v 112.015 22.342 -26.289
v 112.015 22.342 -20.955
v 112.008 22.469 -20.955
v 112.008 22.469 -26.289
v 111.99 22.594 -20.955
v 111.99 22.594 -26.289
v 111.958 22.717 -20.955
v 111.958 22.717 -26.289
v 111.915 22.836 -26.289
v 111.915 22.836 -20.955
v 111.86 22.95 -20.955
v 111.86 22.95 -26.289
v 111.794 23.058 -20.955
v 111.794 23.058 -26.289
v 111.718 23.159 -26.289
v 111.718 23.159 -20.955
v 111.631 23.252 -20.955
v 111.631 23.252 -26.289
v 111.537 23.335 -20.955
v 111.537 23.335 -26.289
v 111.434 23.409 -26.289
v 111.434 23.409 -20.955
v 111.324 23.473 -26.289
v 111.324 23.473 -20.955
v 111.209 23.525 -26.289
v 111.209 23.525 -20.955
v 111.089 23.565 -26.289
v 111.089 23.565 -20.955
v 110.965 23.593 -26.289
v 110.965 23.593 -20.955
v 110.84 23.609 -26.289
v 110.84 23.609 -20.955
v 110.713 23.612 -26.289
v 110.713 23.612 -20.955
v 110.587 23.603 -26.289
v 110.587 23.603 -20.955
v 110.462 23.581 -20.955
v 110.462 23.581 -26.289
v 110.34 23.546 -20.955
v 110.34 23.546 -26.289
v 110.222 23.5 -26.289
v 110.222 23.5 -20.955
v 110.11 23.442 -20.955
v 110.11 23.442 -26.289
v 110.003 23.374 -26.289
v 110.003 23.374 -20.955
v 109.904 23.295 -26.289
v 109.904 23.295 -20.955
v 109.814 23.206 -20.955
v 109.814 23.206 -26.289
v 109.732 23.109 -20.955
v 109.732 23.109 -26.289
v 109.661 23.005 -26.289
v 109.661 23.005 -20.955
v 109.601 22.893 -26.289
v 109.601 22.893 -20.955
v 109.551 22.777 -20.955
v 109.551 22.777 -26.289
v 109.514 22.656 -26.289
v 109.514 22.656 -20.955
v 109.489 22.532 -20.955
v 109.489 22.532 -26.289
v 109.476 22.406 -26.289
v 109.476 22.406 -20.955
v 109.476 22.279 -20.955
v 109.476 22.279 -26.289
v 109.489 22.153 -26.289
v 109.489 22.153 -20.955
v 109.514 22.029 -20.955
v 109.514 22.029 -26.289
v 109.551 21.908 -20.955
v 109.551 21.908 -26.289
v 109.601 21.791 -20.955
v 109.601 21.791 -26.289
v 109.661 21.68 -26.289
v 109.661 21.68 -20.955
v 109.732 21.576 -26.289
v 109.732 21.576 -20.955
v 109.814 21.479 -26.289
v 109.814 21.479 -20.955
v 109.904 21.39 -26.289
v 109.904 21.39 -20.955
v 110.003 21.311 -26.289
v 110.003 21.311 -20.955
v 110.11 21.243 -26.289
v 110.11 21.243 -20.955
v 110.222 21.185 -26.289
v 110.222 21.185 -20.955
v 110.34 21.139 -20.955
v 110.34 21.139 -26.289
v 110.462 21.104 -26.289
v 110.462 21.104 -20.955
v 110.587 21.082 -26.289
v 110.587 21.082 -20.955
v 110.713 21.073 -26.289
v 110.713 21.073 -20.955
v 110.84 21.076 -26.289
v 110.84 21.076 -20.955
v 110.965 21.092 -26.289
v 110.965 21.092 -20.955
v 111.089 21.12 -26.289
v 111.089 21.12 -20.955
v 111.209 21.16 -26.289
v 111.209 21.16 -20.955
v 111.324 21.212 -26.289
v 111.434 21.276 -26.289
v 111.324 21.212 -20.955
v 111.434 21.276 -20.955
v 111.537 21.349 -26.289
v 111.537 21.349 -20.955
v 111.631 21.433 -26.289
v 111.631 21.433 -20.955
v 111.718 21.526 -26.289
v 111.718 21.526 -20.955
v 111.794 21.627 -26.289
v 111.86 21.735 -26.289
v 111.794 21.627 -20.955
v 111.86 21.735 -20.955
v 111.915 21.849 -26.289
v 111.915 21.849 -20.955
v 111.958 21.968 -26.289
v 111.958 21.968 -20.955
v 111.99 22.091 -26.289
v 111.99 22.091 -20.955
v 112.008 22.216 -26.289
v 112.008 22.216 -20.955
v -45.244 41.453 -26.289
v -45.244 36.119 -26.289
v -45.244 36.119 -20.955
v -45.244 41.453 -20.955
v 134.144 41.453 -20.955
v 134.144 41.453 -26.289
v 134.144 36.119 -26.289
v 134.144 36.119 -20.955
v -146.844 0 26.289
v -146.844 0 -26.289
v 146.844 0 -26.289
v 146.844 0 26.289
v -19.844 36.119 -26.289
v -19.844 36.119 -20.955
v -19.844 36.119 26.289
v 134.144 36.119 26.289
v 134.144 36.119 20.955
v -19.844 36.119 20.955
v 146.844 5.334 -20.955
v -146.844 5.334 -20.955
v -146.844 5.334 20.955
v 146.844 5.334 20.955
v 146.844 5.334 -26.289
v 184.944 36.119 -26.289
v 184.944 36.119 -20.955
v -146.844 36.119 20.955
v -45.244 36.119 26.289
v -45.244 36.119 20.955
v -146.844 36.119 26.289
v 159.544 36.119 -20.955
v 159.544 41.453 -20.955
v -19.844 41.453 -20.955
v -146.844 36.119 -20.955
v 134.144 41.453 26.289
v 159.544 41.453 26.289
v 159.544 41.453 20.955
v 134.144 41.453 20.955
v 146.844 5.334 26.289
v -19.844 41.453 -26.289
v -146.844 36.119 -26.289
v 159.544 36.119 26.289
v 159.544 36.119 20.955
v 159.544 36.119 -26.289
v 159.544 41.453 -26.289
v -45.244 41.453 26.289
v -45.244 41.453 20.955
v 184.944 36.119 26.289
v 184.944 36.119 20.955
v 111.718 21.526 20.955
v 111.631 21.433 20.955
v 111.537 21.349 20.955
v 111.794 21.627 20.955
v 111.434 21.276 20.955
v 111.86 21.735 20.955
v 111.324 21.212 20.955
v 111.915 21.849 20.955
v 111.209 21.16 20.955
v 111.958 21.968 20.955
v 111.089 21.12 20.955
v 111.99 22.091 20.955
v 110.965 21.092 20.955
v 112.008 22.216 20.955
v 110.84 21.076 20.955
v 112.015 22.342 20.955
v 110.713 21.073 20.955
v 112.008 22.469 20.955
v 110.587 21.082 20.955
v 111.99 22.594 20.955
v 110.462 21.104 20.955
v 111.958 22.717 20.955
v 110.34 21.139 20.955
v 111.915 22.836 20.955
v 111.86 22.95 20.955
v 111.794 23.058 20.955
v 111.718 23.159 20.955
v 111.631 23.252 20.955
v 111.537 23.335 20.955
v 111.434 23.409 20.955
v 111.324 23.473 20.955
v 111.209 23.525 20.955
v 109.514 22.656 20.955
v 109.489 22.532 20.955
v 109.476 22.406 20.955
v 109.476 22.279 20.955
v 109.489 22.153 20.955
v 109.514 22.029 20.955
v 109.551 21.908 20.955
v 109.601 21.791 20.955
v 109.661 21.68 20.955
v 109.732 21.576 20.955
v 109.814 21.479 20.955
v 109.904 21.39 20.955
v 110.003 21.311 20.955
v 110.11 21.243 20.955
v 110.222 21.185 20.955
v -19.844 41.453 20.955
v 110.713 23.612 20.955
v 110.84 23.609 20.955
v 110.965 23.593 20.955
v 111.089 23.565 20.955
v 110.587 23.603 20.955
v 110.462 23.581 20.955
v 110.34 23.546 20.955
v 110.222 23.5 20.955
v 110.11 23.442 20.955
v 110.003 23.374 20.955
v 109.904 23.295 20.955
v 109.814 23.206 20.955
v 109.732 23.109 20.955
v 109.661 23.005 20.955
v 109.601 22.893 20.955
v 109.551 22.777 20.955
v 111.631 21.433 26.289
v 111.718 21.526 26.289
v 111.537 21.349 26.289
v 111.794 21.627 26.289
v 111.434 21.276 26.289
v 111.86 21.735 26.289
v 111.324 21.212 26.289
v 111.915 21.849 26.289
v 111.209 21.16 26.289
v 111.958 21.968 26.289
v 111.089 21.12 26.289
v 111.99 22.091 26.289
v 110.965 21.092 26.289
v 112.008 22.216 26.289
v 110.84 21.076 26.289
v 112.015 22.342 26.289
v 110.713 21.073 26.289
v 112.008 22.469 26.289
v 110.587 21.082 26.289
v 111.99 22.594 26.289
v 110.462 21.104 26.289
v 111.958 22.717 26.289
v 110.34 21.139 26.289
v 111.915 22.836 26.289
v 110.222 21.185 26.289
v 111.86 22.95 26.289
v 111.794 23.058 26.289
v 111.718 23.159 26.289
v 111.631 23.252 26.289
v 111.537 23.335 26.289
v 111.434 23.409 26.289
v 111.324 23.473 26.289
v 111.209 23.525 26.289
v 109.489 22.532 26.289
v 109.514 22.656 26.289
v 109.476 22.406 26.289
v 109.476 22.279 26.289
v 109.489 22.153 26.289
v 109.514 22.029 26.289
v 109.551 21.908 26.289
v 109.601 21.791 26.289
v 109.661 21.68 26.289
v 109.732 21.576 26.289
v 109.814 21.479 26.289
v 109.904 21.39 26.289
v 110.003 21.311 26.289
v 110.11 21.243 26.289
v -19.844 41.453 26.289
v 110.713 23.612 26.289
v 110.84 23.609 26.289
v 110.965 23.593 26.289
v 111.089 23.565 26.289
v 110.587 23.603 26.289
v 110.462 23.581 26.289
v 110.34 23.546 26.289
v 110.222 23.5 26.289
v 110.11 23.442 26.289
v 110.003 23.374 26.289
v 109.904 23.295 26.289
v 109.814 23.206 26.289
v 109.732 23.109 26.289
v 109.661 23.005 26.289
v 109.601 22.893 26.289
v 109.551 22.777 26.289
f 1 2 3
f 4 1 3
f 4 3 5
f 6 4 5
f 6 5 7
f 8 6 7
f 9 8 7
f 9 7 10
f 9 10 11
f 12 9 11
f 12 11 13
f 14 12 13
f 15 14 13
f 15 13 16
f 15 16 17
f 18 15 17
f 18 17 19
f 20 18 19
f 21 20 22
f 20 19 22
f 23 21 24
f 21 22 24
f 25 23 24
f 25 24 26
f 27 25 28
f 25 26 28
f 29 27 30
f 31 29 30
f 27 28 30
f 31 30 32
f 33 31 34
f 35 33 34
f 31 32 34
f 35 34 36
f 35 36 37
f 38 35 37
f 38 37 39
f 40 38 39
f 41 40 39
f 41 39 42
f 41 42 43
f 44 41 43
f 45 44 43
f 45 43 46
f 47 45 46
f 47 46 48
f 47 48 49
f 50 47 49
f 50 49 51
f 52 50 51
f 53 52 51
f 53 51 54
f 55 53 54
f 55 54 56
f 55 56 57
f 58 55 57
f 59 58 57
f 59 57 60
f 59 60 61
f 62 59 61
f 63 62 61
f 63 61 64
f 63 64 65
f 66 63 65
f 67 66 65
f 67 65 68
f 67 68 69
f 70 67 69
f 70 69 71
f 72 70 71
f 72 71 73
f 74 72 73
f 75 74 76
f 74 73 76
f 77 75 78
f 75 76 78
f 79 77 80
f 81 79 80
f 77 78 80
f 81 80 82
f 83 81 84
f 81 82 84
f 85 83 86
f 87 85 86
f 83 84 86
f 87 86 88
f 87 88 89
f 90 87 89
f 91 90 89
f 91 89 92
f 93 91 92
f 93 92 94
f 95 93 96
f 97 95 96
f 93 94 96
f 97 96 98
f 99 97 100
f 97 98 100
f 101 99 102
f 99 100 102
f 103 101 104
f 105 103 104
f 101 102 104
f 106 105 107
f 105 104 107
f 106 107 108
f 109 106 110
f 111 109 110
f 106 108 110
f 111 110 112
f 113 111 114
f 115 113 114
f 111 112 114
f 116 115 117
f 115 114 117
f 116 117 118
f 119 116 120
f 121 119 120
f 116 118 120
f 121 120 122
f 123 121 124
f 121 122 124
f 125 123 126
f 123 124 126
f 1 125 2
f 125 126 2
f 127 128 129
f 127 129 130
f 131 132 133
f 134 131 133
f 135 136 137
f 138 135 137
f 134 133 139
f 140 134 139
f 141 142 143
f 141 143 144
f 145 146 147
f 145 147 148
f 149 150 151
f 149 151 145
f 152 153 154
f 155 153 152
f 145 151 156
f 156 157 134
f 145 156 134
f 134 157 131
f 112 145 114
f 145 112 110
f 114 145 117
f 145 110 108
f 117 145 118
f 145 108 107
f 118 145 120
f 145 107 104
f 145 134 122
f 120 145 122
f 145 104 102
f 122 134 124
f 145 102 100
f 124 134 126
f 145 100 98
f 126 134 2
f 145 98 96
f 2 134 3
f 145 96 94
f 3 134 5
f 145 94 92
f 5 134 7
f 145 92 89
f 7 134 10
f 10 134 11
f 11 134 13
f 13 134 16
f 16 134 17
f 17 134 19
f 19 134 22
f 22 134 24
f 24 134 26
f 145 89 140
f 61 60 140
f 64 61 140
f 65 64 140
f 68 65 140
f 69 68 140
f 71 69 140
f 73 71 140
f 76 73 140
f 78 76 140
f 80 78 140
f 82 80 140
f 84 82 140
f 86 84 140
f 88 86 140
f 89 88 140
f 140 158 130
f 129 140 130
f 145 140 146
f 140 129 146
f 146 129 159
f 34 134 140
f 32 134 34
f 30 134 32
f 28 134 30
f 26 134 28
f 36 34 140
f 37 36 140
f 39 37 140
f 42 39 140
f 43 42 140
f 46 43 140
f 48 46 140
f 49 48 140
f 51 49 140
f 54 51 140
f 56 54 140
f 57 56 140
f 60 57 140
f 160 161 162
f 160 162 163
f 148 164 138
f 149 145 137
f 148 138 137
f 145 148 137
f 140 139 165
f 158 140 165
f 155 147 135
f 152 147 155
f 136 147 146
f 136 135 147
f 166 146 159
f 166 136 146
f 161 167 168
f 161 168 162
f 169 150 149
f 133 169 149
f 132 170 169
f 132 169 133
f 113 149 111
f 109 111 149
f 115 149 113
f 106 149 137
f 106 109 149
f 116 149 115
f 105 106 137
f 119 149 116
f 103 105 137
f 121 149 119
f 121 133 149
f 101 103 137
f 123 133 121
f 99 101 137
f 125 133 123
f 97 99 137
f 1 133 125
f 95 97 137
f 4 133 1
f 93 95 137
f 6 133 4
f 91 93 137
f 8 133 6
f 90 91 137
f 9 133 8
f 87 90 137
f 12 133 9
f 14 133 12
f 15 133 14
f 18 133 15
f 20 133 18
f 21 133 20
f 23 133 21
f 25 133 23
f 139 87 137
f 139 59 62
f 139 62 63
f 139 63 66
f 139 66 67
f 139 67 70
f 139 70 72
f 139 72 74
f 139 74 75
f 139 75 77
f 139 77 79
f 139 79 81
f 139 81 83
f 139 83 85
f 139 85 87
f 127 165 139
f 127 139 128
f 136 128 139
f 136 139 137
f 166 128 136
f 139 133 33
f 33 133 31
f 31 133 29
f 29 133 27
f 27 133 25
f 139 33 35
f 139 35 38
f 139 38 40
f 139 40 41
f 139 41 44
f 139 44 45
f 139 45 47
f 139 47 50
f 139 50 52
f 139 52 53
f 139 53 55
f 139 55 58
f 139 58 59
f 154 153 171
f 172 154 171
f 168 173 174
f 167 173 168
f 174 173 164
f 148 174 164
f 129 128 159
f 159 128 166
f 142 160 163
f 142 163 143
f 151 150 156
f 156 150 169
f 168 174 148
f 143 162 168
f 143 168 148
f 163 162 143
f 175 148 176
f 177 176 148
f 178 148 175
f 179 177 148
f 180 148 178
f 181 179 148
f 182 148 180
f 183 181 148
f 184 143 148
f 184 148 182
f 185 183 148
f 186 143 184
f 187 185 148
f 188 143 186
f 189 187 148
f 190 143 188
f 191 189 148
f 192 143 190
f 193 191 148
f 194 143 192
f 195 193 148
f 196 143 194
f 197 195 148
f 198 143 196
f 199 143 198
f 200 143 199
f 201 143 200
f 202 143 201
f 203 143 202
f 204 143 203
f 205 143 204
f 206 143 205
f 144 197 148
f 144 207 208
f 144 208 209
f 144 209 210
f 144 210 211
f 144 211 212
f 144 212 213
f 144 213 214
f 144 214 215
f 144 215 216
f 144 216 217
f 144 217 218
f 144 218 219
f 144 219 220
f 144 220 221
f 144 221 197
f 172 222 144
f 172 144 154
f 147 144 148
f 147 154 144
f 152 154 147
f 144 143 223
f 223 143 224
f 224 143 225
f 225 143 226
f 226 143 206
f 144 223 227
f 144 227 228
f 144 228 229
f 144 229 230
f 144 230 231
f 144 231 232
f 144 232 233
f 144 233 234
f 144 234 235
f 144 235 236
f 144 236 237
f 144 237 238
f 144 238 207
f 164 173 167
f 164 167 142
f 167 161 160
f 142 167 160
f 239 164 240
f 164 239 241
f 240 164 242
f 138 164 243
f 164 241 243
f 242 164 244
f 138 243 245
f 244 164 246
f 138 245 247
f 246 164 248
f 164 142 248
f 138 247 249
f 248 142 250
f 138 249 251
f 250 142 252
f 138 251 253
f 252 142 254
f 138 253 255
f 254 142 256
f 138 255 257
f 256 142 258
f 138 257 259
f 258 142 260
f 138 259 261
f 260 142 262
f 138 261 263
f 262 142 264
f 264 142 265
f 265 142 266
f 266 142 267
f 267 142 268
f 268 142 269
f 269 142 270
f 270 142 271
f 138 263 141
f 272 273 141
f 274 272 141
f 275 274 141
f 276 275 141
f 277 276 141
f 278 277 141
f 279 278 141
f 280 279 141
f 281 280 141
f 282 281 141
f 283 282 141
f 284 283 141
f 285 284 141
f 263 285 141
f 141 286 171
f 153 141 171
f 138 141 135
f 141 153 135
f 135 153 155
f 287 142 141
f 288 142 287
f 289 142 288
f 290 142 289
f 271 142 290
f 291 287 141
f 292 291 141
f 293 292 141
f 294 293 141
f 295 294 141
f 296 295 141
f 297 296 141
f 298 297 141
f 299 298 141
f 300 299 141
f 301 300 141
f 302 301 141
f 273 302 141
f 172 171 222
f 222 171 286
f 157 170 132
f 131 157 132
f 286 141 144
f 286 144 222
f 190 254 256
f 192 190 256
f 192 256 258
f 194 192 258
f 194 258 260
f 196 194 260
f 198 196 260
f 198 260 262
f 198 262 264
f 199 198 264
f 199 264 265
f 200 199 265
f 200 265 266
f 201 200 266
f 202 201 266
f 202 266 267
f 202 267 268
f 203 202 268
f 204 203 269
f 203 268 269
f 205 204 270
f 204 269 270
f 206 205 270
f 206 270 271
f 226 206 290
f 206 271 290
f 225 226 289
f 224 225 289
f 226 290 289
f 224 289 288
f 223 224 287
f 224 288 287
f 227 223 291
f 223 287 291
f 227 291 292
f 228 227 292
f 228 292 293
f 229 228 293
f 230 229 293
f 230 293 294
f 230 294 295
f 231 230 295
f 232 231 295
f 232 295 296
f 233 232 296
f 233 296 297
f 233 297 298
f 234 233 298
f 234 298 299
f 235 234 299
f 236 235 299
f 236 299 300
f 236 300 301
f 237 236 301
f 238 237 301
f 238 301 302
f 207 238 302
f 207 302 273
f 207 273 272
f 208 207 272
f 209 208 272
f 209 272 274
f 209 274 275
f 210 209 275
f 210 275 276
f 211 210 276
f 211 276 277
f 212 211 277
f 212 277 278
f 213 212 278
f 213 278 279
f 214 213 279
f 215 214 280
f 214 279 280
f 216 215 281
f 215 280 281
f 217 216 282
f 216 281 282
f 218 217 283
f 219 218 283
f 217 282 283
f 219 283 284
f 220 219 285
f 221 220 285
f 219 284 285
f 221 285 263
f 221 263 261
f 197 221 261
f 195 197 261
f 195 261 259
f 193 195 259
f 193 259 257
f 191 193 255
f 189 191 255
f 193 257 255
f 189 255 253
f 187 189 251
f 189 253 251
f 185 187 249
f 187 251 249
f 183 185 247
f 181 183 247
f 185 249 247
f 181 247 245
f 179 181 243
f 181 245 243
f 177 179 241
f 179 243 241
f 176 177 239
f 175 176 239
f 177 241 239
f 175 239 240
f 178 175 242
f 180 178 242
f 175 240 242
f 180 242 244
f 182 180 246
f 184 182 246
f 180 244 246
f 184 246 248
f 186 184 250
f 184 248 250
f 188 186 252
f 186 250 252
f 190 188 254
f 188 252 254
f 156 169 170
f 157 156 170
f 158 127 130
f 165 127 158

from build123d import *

# Parameters (mm, degrees)
SKETCH2_W              = 293.6875
SKETCH2_H              = 52.578
BOSS_EXTRUDE1_DEPTH    = 5.334
SKETCH3_W              = 25.4
SKETCH3_H              = 5.334
BOSS_EXTRUDE2_DEPTH    = 5.334
SKETCH4_R              = 1.27
BBQ_SKEWER_HOLES_DEPTH = 53.578


with BuildPart() as part:
    # Sketch2 → Boss-Extrude1 (new body)
    with BuildSketch(Plane(origin=(0, 0, 0), x_dir=(1, 0, 0), z_dir=(0, 1, 0))):
        Rectangle(SKETCH2_W, SKETCH2_H)
    extrude(amount=BOSS_EXTRUDE1_DEPTH)

    # Sketch3 → Boss-Extrude2 (add)
    with BuildSketch(Plane.XY.offset(26.289)):
        Polygon((184.94375, 36.1188), (146.84375, 5.334), (-146.84375, 5.334), (-146.84375, 36.1188), (146.84375, 36.1188), align=None)
        with Locations((-32.54375, 38.7858)):
            Rectangle(SKETCH3_W, SKETCH3_H)
        Polygon((146.84375, 36.1188), (159.54375, 36.1188), (159.54375, 41.4528), (134.14375, 41.4528), (134.14375, 36.1188), align=None)
    boss_extrude2 = extrude(amount=-BOSS_EXTRUDE2_DEPTH)

    # Mirror1: Boss-Extrude2 across plane
    add(boss_extrude2.mirror(Plane.XY))

    # Sketch4 → BBQ Skewer Holes (cut, through all)
    with BuildSketch(Plane.XY.offset(26.289)):
        with Locations((110.744734301, 22.342412484)):
            Circle(SKETCH4_R)
    extrude(amount=-BBQ_SKEWER_HOLES_DEPTH, mode=Mode.SUBTRACT)


solid = part.part
